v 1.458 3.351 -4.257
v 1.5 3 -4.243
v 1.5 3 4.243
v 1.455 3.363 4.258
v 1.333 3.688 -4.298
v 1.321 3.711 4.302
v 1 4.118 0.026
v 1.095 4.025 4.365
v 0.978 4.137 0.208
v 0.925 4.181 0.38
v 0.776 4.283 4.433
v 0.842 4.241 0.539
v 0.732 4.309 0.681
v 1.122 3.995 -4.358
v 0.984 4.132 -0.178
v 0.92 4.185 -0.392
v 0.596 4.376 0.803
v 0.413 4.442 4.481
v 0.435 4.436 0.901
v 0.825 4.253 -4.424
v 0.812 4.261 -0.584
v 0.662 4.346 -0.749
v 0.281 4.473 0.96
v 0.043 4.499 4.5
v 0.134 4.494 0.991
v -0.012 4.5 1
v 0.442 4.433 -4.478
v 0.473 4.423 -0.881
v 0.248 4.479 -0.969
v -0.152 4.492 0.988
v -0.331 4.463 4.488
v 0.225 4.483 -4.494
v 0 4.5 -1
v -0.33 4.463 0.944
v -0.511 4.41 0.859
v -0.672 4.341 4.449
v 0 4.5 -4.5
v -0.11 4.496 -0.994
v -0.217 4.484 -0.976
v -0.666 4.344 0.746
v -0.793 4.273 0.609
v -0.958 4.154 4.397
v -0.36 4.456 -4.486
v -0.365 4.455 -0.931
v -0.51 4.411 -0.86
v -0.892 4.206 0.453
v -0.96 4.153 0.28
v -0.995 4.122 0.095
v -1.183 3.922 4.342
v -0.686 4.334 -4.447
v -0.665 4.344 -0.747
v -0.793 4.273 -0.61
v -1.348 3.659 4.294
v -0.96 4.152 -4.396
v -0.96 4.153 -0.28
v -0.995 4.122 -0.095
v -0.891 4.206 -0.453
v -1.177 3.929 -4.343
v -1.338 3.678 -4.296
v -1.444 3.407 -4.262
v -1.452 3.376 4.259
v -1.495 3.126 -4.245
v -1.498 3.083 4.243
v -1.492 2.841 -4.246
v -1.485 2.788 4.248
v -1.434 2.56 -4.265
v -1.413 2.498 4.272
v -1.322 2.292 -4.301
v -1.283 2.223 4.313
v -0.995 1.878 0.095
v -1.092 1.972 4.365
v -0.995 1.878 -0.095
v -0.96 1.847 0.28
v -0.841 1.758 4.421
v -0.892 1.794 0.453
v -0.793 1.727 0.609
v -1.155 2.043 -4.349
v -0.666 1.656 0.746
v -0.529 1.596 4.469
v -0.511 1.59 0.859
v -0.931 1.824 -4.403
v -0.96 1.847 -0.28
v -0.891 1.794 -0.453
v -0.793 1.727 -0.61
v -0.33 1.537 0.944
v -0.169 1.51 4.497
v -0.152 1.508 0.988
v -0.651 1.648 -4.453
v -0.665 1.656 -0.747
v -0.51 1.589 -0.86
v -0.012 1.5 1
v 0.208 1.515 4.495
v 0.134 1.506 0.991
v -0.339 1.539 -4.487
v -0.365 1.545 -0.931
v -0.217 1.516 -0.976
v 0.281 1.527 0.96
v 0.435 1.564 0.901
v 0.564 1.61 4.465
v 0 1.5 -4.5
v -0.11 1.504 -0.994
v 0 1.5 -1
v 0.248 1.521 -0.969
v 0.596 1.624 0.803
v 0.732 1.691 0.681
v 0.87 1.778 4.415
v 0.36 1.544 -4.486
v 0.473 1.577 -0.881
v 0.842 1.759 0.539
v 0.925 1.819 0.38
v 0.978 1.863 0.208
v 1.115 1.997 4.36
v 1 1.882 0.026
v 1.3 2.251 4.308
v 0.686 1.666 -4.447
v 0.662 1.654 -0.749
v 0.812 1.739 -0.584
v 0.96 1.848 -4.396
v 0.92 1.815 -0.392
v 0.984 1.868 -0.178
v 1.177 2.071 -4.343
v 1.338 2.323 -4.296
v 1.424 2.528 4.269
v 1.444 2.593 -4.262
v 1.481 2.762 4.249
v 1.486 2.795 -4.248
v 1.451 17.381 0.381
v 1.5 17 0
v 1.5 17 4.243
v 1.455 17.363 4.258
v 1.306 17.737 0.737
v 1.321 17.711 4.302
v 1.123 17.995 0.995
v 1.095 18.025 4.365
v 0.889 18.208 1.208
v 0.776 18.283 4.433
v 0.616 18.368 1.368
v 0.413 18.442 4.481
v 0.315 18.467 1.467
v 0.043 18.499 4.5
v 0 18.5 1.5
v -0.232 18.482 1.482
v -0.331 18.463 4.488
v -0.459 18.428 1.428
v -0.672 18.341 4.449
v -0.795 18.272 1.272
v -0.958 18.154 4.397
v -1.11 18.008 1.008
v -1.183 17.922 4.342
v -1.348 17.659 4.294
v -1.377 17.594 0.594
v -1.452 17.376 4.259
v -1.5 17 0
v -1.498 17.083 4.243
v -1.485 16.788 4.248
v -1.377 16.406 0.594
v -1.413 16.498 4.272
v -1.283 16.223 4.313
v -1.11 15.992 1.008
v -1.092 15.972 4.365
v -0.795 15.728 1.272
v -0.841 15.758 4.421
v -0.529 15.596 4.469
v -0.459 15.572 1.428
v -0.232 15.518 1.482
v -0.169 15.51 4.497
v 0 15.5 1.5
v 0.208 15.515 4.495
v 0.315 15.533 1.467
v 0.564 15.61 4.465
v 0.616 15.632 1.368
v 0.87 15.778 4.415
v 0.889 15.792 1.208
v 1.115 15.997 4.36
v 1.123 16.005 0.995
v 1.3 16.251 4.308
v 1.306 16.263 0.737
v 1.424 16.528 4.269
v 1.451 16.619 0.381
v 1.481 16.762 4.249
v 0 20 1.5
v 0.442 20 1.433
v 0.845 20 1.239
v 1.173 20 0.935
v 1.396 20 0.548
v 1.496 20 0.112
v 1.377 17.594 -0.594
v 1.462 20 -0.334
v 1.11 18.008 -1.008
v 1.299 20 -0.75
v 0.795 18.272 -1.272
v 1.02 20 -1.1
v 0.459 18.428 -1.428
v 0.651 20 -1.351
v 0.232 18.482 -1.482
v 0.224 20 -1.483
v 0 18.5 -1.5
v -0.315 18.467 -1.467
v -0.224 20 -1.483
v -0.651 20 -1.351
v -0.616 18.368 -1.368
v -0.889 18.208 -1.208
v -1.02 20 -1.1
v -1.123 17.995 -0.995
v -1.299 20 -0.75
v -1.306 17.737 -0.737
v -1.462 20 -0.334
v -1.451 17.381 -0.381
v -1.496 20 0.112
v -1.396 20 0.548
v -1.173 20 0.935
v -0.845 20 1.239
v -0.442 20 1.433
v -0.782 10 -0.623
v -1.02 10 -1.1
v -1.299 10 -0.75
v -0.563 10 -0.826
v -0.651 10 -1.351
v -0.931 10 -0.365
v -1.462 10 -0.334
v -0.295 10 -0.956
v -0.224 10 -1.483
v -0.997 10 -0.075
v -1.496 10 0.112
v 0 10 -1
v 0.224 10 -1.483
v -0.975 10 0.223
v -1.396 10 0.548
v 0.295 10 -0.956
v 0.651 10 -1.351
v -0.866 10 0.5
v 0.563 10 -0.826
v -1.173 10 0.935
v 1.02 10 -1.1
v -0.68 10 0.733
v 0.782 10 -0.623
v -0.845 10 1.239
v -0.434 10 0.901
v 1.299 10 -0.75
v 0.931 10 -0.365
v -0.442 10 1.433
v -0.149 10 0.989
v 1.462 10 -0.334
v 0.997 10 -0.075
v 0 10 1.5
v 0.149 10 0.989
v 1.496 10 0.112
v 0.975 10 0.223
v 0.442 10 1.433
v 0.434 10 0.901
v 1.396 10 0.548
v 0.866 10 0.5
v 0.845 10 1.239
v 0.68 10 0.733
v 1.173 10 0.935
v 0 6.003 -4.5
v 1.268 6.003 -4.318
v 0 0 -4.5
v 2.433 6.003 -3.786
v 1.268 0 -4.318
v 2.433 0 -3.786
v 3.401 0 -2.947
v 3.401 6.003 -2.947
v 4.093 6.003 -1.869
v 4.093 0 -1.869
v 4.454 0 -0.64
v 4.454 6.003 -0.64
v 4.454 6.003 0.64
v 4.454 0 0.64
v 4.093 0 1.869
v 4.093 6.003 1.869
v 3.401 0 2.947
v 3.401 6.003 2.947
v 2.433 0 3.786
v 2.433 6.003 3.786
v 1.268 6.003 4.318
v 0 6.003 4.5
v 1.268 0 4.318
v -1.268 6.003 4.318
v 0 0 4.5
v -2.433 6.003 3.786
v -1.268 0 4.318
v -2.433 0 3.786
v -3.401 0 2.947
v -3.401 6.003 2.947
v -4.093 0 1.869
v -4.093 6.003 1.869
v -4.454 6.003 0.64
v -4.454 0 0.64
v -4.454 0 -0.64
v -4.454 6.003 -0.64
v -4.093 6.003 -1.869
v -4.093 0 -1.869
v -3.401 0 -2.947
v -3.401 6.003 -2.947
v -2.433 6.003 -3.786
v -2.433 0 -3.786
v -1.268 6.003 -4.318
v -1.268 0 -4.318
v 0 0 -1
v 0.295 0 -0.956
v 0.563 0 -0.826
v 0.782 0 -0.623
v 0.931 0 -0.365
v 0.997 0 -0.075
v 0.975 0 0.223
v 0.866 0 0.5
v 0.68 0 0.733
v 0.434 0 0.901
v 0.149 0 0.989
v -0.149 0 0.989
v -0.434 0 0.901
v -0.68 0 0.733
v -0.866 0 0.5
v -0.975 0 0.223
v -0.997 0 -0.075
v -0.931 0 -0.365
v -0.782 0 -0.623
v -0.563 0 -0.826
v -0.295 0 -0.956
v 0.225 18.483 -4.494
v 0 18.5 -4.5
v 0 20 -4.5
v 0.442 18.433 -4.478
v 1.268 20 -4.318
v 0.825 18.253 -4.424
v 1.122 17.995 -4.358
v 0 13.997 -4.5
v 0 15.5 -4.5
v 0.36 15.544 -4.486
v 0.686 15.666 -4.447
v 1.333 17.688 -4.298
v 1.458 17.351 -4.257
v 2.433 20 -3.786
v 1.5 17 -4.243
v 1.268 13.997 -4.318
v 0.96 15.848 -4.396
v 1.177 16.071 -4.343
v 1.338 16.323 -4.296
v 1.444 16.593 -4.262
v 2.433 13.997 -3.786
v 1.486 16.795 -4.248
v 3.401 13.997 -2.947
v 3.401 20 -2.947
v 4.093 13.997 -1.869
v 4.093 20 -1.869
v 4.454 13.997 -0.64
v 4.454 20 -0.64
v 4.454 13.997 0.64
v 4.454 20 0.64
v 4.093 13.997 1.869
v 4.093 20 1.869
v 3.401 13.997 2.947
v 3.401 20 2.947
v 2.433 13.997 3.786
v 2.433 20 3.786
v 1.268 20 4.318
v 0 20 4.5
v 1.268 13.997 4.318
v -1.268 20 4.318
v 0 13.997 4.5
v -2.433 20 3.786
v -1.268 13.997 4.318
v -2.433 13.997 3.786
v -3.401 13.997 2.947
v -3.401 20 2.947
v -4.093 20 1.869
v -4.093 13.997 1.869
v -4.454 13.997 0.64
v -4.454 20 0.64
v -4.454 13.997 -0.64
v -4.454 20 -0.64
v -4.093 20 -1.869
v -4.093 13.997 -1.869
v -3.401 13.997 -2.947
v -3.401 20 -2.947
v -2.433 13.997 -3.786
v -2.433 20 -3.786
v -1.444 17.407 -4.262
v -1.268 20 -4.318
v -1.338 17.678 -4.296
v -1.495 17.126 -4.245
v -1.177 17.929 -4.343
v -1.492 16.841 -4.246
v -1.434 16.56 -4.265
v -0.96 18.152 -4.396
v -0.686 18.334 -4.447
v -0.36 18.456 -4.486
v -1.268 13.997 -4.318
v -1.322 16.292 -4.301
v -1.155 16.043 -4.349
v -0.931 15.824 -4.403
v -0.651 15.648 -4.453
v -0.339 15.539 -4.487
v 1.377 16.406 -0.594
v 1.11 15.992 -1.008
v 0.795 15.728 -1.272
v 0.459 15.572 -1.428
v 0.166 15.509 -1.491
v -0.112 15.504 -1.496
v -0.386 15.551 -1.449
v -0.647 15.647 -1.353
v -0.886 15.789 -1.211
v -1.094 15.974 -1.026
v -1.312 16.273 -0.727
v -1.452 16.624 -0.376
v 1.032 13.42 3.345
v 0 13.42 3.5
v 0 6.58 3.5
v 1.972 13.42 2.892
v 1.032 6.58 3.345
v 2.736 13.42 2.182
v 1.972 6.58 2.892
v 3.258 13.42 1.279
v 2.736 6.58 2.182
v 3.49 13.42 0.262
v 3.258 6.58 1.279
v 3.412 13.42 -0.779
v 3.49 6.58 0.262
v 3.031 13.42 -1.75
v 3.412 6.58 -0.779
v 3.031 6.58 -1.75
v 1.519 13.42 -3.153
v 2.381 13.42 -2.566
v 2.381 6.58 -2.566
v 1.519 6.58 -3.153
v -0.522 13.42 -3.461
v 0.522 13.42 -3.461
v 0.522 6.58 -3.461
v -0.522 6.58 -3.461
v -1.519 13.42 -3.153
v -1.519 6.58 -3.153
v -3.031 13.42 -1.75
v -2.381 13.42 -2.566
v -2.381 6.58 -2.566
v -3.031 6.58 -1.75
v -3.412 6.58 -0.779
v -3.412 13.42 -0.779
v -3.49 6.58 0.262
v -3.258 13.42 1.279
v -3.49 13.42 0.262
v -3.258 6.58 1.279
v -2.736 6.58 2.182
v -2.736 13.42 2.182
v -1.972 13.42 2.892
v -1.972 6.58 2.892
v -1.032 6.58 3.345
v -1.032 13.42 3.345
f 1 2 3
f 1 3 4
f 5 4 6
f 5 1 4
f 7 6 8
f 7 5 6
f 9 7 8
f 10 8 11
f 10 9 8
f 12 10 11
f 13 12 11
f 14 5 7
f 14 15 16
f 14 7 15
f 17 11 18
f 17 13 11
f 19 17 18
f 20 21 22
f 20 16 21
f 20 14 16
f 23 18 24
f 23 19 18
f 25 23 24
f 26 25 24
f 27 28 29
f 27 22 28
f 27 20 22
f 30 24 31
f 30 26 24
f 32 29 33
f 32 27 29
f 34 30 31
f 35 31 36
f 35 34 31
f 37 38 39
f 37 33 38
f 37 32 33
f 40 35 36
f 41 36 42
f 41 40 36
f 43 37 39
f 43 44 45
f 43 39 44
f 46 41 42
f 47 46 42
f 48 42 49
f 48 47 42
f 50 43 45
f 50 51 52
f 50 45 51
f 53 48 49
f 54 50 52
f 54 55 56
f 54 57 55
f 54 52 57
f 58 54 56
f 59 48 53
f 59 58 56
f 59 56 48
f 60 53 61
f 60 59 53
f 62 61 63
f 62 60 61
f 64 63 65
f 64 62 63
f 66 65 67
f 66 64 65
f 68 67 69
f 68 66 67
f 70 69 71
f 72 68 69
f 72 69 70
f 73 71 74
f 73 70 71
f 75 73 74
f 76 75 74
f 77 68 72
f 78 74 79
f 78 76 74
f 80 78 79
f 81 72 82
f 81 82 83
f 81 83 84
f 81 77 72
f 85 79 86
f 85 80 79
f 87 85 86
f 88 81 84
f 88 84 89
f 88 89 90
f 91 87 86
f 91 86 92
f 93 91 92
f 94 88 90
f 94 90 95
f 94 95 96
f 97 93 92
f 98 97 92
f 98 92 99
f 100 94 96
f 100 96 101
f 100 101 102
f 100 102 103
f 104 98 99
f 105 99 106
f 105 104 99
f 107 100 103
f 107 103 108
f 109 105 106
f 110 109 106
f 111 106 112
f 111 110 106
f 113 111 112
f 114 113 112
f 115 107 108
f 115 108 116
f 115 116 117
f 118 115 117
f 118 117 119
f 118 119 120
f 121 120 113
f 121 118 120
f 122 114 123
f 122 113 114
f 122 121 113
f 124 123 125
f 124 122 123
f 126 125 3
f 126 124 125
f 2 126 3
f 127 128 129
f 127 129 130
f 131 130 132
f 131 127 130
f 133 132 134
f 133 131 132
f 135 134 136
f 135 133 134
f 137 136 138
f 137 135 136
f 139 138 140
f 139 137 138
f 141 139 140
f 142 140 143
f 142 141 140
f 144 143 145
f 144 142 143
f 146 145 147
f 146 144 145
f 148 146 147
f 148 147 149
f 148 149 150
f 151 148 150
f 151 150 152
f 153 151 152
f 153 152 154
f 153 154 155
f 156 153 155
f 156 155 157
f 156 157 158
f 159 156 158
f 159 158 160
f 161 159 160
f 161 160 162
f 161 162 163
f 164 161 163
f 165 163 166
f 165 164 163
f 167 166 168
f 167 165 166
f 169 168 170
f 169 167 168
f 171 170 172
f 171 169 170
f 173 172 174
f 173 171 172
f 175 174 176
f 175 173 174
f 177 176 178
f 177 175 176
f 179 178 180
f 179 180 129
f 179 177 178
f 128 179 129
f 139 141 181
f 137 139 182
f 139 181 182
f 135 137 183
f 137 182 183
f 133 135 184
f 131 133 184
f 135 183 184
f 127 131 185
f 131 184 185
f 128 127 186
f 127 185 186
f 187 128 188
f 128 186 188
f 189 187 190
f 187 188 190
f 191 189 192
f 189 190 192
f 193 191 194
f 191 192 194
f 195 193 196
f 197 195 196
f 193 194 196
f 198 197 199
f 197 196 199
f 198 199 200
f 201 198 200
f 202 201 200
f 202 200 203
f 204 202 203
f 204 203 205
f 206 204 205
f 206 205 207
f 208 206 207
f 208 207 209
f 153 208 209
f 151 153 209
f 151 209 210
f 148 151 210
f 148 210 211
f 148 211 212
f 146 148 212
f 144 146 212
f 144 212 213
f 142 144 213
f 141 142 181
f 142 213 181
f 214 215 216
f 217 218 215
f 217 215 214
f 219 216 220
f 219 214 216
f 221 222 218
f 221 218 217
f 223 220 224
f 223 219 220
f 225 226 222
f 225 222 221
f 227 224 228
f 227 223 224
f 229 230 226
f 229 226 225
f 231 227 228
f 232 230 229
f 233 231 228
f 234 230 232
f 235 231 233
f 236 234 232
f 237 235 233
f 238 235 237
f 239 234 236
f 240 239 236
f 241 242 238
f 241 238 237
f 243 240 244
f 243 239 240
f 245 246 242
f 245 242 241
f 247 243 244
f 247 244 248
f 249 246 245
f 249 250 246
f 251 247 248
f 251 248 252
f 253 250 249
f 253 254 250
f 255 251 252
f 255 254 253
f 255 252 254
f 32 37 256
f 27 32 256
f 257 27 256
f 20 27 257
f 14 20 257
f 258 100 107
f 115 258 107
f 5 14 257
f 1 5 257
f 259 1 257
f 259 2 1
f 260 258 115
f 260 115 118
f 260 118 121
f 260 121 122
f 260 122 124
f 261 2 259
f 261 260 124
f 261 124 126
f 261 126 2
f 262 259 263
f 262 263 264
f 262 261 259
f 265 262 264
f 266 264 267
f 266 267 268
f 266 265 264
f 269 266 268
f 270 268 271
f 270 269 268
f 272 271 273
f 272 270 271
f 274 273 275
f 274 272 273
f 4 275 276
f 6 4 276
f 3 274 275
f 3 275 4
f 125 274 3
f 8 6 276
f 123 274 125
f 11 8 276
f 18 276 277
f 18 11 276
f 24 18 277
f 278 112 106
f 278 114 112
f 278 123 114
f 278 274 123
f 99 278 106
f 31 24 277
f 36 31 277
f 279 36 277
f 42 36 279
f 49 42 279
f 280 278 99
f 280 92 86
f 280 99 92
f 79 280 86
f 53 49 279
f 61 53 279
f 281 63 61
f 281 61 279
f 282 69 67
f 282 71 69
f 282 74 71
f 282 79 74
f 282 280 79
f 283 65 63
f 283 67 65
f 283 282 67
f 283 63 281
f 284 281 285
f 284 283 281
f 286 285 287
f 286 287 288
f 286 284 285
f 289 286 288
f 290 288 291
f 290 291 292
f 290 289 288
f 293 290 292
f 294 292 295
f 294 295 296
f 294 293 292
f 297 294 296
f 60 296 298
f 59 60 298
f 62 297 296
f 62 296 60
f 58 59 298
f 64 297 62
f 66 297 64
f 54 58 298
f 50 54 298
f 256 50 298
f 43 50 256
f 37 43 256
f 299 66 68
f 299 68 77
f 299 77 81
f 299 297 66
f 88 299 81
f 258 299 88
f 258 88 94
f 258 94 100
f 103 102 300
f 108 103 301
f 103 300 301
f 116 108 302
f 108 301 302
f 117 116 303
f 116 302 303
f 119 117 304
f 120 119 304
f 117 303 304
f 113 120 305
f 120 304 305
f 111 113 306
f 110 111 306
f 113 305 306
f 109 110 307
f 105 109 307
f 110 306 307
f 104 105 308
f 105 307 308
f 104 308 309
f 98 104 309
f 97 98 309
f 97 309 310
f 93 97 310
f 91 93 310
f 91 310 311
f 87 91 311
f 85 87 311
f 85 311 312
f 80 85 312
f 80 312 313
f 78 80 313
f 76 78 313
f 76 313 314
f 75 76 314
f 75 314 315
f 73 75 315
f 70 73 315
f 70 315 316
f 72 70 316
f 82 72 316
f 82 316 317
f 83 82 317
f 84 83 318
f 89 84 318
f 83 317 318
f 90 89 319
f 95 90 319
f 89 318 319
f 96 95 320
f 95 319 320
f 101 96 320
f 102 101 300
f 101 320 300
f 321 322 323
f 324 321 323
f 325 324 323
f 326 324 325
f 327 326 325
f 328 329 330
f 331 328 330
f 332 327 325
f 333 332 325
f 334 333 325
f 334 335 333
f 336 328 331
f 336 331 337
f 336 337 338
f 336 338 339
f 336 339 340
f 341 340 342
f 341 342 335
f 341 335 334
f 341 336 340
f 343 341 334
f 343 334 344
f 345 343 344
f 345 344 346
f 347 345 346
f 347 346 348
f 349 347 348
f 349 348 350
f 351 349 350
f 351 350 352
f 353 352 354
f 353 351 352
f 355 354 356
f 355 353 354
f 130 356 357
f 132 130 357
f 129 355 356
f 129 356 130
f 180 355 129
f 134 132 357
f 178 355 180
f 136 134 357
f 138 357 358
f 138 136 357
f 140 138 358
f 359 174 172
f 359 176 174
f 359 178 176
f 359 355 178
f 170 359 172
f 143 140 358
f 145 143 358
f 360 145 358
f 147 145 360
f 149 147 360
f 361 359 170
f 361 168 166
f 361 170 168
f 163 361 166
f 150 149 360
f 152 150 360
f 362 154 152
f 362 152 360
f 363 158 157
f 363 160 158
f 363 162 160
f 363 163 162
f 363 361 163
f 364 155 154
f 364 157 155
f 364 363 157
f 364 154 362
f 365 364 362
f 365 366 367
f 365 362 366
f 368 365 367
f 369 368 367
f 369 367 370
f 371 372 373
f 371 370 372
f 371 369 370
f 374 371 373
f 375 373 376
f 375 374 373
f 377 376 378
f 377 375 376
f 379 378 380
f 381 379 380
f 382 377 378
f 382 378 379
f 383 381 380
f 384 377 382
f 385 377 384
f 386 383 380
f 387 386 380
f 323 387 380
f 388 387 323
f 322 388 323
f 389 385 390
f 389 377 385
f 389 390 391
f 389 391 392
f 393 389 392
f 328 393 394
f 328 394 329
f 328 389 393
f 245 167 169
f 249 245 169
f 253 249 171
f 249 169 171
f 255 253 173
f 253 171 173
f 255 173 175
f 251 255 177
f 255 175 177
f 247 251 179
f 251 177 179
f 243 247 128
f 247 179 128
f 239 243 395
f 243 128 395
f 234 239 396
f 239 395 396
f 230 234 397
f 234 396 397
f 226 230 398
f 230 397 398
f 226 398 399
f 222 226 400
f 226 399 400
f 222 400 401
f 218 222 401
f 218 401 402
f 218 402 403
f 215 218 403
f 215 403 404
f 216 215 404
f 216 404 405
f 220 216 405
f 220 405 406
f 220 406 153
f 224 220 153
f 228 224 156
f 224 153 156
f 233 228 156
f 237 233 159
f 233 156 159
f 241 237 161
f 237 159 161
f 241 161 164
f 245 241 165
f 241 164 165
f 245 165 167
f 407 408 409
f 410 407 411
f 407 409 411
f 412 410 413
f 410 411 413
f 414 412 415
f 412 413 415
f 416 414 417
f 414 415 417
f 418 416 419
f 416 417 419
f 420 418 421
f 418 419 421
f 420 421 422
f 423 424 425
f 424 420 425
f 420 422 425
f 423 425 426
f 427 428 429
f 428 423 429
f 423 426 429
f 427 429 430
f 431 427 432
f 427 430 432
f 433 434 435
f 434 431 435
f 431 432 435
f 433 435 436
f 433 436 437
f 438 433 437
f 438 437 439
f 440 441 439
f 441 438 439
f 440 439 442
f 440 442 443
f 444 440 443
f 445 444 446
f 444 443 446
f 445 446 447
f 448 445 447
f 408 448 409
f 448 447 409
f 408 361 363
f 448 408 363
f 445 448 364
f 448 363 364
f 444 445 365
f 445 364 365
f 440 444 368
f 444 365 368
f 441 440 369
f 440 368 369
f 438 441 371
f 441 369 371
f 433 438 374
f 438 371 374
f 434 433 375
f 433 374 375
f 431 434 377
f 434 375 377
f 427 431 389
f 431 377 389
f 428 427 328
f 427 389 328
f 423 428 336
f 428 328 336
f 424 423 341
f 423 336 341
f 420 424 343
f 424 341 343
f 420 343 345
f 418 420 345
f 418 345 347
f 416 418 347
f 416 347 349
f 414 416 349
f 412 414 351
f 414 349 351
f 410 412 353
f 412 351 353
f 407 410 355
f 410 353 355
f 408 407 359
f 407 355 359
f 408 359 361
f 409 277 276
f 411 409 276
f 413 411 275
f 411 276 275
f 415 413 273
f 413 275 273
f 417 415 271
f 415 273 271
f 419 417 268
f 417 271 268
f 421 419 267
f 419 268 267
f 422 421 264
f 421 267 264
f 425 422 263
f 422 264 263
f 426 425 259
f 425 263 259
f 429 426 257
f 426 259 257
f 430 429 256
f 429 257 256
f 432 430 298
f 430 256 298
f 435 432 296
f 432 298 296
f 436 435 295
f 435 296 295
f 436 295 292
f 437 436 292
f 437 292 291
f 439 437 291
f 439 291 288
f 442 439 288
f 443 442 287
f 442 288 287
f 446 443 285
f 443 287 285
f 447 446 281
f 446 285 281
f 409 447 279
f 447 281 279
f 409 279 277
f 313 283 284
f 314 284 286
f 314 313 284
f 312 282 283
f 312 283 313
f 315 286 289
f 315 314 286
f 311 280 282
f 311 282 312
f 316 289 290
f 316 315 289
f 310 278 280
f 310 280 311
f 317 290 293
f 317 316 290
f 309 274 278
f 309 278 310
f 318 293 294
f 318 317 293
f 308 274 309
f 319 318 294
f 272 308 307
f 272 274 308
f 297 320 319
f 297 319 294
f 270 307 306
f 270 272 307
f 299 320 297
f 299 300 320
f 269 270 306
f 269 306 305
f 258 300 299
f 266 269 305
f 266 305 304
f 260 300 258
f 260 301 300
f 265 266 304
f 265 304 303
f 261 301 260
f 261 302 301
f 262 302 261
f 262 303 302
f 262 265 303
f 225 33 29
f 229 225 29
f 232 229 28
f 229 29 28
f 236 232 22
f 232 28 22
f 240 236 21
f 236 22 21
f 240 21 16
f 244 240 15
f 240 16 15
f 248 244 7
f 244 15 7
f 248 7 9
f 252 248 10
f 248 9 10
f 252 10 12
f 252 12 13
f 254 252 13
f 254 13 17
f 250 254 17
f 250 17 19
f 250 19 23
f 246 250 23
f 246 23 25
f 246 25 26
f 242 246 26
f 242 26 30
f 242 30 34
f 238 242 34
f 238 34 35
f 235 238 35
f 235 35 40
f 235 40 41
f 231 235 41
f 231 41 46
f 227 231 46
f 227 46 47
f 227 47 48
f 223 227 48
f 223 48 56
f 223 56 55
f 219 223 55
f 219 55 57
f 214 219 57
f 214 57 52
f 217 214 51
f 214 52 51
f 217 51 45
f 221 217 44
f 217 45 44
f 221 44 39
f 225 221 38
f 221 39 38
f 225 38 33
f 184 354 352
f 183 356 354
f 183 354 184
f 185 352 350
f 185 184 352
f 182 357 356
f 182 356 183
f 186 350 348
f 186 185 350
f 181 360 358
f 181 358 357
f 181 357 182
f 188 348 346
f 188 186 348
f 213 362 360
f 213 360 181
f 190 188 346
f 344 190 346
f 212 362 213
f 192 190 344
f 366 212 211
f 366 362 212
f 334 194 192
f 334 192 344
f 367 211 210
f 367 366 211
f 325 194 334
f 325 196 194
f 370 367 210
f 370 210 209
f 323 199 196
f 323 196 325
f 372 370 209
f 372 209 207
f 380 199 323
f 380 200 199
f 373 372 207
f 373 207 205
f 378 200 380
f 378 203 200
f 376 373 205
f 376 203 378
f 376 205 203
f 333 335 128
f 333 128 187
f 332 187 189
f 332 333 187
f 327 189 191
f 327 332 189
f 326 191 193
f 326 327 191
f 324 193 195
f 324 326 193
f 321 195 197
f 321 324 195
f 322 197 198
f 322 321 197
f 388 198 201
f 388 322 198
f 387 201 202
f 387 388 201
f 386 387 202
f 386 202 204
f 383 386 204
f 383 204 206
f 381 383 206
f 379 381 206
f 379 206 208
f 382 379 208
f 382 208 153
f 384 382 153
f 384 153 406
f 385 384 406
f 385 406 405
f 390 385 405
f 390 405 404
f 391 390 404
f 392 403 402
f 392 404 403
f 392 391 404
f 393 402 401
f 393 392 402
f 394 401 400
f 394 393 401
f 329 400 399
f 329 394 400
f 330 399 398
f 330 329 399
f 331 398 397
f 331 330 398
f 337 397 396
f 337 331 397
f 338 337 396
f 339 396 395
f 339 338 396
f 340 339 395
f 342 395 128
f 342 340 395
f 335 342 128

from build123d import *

# Parameters (mm, degrees)
SKETCH_1_R               = 3.5
EXTRUDE_1_DEPTH          = 20
SKETCH_2_R               = 1.5
CUT_EXTRUDE_1_DEPTH      = 10
SKETCH_3_R               = 1
CUT_EXTRUDE_2_DEPTH      = 10
SKETCH_4_R               = 4.5
SKETCH_4_R_2             = 3.5
EXTRUDE_2_DEPTH          = 6
EXTRUDE_START            = -6
SKETCH_5_R               = 4.5
SKETCH_5_R_2             = 3.5
EXTRUDE_3_DEPTH          = 6
CHAMFER_1_SIZE           = 0.58
CHAMFER_1_SIZE_2         = 1.004589468
CUT_EXTRUDE_3_DEPTH      = 21.988091862
CUT_EXTRUDE_3_DEPTH_BACK = 21.988091862
SKETCH_6_R               = 1.5


with BuildPart() as part:
    # 草圖1 → 填料-伸長1 (new body)
    with BuildSketch(Plane(origin=(0, 0, 0), x_dir=(1, 0, 0), z_dir=(0, 1, 0))):
        with Locations(Location((0, 0, 0), (0, 0, 270))):
            Circle(SKETCH_1_R)
    extrude(amount=EXTRUDE_1_DEPTH)

    # 草圖2 → 除料-伸長1 (cut)
    with BuildSketch(Plane(origin=(0, 20, 0), x_dir=(1, 0, 0), z_dir=(0, 1, 0))):
        with Locations(Location((0, 0, 0), (0, 0, 270))):
            Circle(SKETCH_2_R)
    extrude(amount=-CUT_EXTRUDE_1_DEPTH, mode=Mode.SUBTRACT)

    # 草圖3 → 除料-伸長2 (cut)
    with BuildSketch(Plane.XZ):
        with Locations(Location((0, 0, 0), (0, 0, 270))):
            Circle(SKETCH_3_R)
    extrude(amount=-CUT_EXTRUDE_2_DEPTH, mode=Mode.SUBTRACT)

    # 草圖4 → 填料-伸長2 (add)
    with BuildSketch(Plane.XZ):
        with Locations(Location((0, 0, 0), (0, 0, 270))):
            Circle(SKETCH_4_R)
        with Locations(Location((0, 0, 0), (0, 0, 270))):
            Circle(SKETCH_4_R_2, mode=Mode.SUBTRACT)
    extrude(amount=-EXTRUDE_2_DEPTH)

    # 草圖5 → 填料-伸長3 (add)
    with BuildSketch(Plane(origin=(0, 20, 0), x_dir=(1, 0, 0), z_dir=(0, 1, 0)).offset(EXTRUDE_START)):
        with Locations(Location((0, 0, 0), (0, 0, 90))):
            Circle(SKETCH_5_R)
        with Locations(Location((0, 0, 0), (0, 0, 90))):
            Circle(SKETCH_5_R_2, mode=Mode.SUBTRACT)
    extrude(amount=EXTRUDE_3_DEPTH)

    # 導角1
    # the kernel refuses this chamfer: 1.004589468, 0.58 mm, written as the material it adds along each edge
    with BuildSketch(Plane(origin=(0, 14, 0), x_dir=(0, 0, 1), z_dir=(1, 0, 0))) as chamfer_1_piece_1_section:
        Polygon((3.5, CHAMFER_1_SIZE), (3.5 + CHAMFER_1_SIZE_2, 0), (3.5, 0), align=None)
    chamfer_1_piece_1 = revolve(axis=Axis((0, 14, 0), (0, -1, 0)), mode=Mode.PRIVATE)
    chamfer_1_piece_1 = chamfer_1_piece_1 & Plane(origin=(0, 13.715905857, 0), x_dir=(0, 0, -1), z_dir=(0, -1, 0)) * Cylinder(4.5, 19, mode=Mode.PRIVATE)
    add(chamfer_1_piece_1)
    with BuildSketch(Plane(origin=(0, 6, 0), x_dir=(0, 0, 1), z_dir=(-1, 0, 0))) as chamfer_1_piece_2_section:
        Polygon((3.5, CHAMFER_1_SIZE), (3.5 + CHAMFER_1_SIZE_2, 0), (3.5, 0), align=None)
    chamfer_1_piece_2 = revolve(axis=Axis((0, 6, 0), (0, 1, 0)), mode=Mode.PRIVATE)
    chamfer_1_piece_2 = chamfer_1_piece_2 & Plane(origin=(0, 6.284094143, 0), x_dir=(0, 0, -1), z_dir=(0, -1, 0)) * Cylinder(4.5, 19, mode=Mode.PRIVATE)
    add(chamfer_1_piece_2)

    # 草圖6 → 除料-伸長3 (cut, two sides: drawn at the far end of the back side and taken through both)
    with BuildSketch(Plane.XY.offset(-CUT_EXTRUDE_3_DEPTH_BACK)):
        with Locations((0, 17)):
            Circle(SKETCH_6_R)
        with Locations((0, 3)):
            Circle(SKETCH_6_R)
    extrude(amount=CUT_EXTRUDE_3_DEPTH + CUT_EXTRUDE_3_DEPTH_BACK, mode=Mode.SUBTRACT)


solid = part.part
